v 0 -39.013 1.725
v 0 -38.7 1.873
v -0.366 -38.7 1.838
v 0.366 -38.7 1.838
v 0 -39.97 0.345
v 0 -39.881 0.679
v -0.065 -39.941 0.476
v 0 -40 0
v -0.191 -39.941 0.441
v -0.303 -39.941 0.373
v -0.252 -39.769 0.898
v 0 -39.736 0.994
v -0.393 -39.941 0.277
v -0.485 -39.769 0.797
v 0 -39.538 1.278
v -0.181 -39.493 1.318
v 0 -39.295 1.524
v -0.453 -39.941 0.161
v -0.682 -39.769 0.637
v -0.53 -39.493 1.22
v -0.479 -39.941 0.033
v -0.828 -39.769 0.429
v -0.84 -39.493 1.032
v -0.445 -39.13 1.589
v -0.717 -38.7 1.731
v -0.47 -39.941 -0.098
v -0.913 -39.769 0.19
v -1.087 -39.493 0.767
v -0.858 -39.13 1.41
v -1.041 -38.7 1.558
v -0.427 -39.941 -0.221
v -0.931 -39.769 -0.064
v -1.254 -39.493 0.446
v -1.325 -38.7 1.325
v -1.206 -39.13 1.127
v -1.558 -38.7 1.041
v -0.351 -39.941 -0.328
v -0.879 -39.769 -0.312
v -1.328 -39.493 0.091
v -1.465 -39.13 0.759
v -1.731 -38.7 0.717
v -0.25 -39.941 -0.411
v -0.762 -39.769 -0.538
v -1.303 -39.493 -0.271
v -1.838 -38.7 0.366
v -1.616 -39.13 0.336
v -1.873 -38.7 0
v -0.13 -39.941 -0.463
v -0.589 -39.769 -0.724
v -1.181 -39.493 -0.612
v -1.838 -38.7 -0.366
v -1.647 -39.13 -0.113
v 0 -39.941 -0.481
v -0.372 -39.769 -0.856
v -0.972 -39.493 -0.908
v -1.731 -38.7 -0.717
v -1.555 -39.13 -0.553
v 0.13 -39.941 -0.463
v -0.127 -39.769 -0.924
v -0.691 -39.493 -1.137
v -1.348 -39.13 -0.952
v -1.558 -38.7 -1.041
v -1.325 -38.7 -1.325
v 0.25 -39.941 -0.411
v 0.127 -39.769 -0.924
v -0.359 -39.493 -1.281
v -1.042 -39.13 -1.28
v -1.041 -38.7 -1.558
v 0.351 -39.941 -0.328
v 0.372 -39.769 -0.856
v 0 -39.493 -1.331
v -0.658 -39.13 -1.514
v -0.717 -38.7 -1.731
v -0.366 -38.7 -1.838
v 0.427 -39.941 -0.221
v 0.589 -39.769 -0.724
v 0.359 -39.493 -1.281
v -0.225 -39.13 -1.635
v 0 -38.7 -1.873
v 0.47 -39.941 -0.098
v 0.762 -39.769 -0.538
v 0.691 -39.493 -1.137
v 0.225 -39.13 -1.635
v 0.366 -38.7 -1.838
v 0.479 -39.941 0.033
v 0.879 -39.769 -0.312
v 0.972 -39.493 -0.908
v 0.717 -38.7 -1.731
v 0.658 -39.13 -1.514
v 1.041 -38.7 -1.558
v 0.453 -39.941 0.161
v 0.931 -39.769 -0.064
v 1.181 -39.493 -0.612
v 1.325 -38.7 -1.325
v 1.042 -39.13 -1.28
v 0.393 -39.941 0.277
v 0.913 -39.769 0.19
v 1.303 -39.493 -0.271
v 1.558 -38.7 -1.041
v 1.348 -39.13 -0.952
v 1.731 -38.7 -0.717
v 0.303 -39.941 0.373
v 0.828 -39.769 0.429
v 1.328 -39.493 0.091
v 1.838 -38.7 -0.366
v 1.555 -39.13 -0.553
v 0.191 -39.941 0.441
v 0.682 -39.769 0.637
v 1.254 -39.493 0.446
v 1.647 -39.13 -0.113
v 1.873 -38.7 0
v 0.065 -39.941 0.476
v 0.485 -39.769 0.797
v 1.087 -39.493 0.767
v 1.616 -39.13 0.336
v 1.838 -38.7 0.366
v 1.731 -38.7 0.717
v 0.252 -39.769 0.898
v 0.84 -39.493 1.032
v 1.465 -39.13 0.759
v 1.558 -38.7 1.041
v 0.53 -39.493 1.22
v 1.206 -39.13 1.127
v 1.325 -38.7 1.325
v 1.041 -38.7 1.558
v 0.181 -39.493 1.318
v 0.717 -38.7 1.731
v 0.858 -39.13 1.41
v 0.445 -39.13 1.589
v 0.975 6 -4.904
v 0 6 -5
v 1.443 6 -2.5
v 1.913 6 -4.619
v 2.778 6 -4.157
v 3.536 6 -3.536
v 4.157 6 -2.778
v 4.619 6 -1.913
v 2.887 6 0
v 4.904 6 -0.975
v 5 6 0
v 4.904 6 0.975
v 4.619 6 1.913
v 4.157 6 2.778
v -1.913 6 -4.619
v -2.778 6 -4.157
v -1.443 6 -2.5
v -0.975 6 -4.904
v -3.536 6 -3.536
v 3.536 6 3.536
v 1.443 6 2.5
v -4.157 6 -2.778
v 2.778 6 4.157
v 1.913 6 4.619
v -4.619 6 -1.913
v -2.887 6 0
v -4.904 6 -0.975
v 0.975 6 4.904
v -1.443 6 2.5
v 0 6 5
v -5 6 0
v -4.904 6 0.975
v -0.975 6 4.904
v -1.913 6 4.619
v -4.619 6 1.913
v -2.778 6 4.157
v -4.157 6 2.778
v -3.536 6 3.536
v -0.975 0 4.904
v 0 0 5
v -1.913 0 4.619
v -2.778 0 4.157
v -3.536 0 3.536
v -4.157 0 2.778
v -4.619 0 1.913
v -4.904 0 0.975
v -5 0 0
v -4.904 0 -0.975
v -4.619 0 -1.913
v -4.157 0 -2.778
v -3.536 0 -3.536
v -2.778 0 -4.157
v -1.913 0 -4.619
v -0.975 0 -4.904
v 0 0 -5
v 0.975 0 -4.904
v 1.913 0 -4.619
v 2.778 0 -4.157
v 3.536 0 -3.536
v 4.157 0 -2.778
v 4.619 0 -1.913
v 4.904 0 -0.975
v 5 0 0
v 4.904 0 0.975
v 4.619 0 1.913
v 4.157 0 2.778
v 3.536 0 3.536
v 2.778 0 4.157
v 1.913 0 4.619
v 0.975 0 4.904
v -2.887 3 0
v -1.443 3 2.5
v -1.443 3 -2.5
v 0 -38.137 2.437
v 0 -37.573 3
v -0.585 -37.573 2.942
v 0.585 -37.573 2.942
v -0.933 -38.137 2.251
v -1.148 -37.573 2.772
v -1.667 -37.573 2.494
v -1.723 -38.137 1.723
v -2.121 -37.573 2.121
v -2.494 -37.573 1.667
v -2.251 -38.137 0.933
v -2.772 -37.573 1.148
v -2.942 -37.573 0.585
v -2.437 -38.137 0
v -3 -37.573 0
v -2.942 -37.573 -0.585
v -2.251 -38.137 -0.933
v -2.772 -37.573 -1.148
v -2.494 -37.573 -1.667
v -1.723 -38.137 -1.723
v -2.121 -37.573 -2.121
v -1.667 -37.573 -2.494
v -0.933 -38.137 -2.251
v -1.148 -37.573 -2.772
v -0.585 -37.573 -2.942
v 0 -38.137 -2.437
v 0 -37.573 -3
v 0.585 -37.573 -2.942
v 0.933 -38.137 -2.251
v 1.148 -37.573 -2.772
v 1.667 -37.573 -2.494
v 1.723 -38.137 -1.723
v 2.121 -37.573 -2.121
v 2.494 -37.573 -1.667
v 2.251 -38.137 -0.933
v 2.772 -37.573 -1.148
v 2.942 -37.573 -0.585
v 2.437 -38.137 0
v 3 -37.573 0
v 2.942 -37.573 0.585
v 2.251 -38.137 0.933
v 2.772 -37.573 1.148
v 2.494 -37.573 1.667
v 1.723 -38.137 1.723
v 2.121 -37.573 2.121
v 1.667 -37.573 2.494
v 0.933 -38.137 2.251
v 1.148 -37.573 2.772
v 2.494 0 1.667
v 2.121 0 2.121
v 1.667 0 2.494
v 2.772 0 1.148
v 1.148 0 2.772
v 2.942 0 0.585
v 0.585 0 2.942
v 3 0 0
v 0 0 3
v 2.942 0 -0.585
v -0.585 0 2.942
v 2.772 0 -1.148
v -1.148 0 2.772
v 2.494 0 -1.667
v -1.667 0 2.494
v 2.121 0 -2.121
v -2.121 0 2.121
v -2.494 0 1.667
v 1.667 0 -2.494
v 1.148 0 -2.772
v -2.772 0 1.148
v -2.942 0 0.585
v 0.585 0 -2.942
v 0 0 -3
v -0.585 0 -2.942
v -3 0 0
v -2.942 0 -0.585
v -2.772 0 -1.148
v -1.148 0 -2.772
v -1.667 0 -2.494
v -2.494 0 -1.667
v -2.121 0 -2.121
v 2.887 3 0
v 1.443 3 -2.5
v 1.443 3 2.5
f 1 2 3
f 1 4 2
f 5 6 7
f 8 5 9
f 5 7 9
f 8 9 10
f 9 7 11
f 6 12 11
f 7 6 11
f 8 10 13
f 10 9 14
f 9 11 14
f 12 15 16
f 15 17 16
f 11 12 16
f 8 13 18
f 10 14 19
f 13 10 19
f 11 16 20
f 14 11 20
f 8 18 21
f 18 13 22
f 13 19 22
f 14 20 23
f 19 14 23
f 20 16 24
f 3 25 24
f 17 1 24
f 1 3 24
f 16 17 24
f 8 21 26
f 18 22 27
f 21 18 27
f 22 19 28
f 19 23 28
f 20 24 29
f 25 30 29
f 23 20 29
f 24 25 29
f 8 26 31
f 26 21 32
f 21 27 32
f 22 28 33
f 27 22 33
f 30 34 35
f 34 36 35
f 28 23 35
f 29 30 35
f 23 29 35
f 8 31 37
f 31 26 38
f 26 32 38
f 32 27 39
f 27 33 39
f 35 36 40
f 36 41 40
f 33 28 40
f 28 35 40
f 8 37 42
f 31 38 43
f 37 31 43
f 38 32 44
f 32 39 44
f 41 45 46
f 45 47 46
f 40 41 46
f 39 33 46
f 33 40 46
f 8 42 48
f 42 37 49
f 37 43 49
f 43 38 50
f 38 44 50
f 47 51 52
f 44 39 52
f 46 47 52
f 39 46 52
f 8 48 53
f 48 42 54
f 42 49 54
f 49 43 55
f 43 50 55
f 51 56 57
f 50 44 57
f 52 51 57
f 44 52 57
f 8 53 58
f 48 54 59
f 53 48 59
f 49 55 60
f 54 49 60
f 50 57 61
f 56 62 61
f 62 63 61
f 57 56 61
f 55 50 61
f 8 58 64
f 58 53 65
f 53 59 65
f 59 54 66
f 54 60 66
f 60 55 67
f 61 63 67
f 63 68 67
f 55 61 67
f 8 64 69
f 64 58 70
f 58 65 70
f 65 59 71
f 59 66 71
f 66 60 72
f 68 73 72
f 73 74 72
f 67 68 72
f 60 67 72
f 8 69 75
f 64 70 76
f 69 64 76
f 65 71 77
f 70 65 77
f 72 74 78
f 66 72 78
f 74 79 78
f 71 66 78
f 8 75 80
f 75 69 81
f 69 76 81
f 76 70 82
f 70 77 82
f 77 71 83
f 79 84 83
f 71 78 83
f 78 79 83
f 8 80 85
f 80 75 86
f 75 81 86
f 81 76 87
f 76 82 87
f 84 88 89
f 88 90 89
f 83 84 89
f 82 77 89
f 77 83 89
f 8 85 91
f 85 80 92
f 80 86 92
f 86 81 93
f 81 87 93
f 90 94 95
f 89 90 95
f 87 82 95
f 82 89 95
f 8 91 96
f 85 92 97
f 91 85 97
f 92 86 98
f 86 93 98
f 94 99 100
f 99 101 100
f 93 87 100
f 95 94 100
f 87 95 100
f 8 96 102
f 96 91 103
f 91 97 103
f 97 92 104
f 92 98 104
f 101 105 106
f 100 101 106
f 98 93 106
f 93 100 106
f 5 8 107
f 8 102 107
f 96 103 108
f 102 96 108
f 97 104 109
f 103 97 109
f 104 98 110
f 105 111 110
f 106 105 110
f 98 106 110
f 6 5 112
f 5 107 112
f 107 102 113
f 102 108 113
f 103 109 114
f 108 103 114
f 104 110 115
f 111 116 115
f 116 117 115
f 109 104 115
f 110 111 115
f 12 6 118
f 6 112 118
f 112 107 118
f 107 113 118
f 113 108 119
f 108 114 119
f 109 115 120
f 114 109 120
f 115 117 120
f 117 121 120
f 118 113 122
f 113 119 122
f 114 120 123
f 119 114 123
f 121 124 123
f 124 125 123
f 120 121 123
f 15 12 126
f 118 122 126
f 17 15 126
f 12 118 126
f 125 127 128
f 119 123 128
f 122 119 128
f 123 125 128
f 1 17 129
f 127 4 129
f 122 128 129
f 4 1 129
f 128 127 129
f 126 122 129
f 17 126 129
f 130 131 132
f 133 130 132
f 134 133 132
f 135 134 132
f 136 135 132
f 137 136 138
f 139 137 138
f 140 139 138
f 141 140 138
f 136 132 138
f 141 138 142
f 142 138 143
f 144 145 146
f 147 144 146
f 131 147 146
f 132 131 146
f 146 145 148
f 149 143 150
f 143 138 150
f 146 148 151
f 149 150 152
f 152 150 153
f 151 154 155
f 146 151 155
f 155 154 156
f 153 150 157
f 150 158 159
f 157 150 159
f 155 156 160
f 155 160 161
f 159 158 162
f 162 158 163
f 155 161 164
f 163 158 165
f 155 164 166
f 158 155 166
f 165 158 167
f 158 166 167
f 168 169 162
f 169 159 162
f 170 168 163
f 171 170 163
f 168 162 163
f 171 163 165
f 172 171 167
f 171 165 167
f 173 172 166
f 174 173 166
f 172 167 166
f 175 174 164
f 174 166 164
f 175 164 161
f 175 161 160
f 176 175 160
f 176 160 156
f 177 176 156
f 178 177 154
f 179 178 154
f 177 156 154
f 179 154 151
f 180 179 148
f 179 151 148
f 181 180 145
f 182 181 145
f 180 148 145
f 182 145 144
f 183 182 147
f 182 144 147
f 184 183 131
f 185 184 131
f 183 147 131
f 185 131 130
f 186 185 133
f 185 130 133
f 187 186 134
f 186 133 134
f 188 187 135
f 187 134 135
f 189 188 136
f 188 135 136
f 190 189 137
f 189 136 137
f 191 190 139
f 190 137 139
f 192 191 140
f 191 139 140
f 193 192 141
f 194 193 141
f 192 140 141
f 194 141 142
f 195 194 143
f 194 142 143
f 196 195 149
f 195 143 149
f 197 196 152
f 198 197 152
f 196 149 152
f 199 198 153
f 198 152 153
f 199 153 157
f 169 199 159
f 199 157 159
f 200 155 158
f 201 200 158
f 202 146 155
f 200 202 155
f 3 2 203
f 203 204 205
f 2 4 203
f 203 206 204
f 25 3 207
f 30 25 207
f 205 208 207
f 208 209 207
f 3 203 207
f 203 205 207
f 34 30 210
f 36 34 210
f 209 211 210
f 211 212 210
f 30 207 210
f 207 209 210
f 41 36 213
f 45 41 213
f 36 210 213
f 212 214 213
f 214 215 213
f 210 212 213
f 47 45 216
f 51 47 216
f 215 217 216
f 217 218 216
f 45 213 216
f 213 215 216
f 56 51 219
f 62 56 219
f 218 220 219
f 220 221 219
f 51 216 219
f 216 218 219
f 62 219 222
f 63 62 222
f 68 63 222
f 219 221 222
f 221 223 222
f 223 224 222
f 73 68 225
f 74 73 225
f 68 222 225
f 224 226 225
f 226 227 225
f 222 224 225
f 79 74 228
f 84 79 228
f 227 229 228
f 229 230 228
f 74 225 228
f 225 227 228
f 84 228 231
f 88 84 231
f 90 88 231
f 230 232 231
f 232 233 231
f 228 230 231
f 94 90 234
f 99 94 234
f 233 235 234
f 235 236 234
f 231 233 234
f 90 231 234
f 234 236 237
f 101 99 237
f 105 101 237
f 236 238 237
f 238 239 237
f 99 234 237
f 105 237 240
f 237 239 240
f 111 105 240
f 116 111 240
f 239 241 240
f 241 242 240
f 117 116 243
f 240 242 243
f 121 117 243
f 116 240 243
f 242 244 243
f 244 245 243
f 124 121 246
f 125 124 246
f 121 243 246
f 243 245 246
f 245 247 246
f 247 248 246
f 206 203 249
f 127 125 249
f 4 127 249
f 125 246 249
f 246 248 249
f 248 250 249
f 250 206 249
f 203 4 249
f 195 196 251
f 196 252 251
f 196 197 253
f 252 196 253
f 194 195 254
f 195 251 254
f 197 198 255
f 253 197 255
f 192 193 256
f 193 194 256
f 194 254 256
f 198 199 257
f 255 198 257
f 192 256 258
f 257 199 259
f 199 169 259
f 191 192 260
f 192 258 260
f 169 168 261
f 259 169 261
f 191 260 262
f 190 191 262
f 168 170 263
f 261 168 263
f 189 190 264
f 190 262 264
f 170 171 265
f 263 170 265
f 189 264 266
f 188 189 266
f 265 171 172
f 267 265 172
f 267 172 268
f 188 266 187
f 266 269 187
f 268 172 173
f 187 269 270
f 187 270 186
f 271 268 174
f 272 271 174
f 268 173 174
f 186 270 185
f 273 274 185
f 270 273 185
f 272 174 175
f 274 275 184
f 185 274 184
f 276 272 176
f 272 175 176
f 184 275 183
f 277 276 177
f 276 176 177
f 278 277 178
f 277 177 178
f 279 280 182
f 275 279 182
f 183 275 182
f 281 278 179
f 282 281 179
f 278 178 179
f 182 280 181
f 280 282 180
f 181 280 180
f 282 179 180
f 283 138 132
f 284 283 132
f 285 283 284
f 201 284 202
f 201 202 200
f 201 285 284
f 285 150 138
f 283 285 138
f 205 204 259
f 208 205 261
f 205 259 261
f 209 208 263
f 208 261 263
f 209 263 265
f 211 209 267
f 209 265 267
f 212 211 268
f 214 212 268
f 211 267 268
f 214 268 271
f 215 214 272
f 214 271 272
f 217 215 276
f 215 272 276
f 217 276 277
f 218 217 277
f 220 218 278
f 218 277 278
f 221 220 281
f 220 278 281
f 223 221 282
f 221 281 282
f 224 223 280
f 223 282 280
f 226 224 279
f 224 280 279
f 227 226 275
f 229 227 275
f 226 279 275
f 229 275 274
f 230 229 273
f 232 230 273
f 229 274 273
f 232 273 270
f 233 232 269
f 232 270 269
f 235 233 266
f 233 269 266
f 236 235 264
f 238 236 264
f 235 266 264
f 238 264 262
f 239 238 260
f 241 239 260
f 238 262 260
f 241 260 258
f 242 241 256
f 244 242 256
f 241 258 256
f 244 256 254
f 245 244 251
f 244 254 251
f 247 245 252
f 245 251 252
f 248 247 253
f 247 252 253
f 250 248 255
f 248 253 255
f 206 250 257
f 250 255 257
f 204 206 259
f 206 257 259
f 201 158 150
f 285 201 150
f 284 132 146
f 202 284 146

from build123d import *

# Parameters (mm, degrees)
CUT_EXTRUDE1_DEPTH = 3


with BuildPart() as part:
    # Sketch1 → Revolve1 (revolve)
    with BuildSketch(Plane.XY, mode=Mode.PRIVATE) as revolve1_sk:
        with BuildLine():
            Line((3, -37.5734994), (3, 0))
            Line((3, 0), (5, 0))
            Line((5, 0), (5, 6))
            Line((5, 6), (0, 6))
            Line((0, 6), (0, -40))
            ThreePointArc((0, -40), (1.140175425, -39.643167673), (1.8734994, -38.7))
            Line((1.8734994, -38.7), (3, -37.5734994))
        make_face()
    revolve(revolve1_sk.sketch.rotate(Axis((0, 61.691642626, 0), (0, -1, 0)), 90), axis=Axis((0, 61.691642626, 0), (0, -1, 0)))

    # Sketch2 → Cut-Extrude1 (cut)
    with BuildSketch(Plane(origin=(0, 6, 0), x_dir=(-1, 0, 0), z_dir=(0, 1, 0))):
        Polygon((-1.443375673, -2.5), (1.443375673, -2.5), (2.886751346, 0), (1.443375673, 2.5), (-1.443375673, 2.5), (-2.886751346, 0), align=None)
    extrude(amount=-CUT_EXTRUDE1_DEPTH, mode=Mode.SUBTRACT)


solid = part.part
